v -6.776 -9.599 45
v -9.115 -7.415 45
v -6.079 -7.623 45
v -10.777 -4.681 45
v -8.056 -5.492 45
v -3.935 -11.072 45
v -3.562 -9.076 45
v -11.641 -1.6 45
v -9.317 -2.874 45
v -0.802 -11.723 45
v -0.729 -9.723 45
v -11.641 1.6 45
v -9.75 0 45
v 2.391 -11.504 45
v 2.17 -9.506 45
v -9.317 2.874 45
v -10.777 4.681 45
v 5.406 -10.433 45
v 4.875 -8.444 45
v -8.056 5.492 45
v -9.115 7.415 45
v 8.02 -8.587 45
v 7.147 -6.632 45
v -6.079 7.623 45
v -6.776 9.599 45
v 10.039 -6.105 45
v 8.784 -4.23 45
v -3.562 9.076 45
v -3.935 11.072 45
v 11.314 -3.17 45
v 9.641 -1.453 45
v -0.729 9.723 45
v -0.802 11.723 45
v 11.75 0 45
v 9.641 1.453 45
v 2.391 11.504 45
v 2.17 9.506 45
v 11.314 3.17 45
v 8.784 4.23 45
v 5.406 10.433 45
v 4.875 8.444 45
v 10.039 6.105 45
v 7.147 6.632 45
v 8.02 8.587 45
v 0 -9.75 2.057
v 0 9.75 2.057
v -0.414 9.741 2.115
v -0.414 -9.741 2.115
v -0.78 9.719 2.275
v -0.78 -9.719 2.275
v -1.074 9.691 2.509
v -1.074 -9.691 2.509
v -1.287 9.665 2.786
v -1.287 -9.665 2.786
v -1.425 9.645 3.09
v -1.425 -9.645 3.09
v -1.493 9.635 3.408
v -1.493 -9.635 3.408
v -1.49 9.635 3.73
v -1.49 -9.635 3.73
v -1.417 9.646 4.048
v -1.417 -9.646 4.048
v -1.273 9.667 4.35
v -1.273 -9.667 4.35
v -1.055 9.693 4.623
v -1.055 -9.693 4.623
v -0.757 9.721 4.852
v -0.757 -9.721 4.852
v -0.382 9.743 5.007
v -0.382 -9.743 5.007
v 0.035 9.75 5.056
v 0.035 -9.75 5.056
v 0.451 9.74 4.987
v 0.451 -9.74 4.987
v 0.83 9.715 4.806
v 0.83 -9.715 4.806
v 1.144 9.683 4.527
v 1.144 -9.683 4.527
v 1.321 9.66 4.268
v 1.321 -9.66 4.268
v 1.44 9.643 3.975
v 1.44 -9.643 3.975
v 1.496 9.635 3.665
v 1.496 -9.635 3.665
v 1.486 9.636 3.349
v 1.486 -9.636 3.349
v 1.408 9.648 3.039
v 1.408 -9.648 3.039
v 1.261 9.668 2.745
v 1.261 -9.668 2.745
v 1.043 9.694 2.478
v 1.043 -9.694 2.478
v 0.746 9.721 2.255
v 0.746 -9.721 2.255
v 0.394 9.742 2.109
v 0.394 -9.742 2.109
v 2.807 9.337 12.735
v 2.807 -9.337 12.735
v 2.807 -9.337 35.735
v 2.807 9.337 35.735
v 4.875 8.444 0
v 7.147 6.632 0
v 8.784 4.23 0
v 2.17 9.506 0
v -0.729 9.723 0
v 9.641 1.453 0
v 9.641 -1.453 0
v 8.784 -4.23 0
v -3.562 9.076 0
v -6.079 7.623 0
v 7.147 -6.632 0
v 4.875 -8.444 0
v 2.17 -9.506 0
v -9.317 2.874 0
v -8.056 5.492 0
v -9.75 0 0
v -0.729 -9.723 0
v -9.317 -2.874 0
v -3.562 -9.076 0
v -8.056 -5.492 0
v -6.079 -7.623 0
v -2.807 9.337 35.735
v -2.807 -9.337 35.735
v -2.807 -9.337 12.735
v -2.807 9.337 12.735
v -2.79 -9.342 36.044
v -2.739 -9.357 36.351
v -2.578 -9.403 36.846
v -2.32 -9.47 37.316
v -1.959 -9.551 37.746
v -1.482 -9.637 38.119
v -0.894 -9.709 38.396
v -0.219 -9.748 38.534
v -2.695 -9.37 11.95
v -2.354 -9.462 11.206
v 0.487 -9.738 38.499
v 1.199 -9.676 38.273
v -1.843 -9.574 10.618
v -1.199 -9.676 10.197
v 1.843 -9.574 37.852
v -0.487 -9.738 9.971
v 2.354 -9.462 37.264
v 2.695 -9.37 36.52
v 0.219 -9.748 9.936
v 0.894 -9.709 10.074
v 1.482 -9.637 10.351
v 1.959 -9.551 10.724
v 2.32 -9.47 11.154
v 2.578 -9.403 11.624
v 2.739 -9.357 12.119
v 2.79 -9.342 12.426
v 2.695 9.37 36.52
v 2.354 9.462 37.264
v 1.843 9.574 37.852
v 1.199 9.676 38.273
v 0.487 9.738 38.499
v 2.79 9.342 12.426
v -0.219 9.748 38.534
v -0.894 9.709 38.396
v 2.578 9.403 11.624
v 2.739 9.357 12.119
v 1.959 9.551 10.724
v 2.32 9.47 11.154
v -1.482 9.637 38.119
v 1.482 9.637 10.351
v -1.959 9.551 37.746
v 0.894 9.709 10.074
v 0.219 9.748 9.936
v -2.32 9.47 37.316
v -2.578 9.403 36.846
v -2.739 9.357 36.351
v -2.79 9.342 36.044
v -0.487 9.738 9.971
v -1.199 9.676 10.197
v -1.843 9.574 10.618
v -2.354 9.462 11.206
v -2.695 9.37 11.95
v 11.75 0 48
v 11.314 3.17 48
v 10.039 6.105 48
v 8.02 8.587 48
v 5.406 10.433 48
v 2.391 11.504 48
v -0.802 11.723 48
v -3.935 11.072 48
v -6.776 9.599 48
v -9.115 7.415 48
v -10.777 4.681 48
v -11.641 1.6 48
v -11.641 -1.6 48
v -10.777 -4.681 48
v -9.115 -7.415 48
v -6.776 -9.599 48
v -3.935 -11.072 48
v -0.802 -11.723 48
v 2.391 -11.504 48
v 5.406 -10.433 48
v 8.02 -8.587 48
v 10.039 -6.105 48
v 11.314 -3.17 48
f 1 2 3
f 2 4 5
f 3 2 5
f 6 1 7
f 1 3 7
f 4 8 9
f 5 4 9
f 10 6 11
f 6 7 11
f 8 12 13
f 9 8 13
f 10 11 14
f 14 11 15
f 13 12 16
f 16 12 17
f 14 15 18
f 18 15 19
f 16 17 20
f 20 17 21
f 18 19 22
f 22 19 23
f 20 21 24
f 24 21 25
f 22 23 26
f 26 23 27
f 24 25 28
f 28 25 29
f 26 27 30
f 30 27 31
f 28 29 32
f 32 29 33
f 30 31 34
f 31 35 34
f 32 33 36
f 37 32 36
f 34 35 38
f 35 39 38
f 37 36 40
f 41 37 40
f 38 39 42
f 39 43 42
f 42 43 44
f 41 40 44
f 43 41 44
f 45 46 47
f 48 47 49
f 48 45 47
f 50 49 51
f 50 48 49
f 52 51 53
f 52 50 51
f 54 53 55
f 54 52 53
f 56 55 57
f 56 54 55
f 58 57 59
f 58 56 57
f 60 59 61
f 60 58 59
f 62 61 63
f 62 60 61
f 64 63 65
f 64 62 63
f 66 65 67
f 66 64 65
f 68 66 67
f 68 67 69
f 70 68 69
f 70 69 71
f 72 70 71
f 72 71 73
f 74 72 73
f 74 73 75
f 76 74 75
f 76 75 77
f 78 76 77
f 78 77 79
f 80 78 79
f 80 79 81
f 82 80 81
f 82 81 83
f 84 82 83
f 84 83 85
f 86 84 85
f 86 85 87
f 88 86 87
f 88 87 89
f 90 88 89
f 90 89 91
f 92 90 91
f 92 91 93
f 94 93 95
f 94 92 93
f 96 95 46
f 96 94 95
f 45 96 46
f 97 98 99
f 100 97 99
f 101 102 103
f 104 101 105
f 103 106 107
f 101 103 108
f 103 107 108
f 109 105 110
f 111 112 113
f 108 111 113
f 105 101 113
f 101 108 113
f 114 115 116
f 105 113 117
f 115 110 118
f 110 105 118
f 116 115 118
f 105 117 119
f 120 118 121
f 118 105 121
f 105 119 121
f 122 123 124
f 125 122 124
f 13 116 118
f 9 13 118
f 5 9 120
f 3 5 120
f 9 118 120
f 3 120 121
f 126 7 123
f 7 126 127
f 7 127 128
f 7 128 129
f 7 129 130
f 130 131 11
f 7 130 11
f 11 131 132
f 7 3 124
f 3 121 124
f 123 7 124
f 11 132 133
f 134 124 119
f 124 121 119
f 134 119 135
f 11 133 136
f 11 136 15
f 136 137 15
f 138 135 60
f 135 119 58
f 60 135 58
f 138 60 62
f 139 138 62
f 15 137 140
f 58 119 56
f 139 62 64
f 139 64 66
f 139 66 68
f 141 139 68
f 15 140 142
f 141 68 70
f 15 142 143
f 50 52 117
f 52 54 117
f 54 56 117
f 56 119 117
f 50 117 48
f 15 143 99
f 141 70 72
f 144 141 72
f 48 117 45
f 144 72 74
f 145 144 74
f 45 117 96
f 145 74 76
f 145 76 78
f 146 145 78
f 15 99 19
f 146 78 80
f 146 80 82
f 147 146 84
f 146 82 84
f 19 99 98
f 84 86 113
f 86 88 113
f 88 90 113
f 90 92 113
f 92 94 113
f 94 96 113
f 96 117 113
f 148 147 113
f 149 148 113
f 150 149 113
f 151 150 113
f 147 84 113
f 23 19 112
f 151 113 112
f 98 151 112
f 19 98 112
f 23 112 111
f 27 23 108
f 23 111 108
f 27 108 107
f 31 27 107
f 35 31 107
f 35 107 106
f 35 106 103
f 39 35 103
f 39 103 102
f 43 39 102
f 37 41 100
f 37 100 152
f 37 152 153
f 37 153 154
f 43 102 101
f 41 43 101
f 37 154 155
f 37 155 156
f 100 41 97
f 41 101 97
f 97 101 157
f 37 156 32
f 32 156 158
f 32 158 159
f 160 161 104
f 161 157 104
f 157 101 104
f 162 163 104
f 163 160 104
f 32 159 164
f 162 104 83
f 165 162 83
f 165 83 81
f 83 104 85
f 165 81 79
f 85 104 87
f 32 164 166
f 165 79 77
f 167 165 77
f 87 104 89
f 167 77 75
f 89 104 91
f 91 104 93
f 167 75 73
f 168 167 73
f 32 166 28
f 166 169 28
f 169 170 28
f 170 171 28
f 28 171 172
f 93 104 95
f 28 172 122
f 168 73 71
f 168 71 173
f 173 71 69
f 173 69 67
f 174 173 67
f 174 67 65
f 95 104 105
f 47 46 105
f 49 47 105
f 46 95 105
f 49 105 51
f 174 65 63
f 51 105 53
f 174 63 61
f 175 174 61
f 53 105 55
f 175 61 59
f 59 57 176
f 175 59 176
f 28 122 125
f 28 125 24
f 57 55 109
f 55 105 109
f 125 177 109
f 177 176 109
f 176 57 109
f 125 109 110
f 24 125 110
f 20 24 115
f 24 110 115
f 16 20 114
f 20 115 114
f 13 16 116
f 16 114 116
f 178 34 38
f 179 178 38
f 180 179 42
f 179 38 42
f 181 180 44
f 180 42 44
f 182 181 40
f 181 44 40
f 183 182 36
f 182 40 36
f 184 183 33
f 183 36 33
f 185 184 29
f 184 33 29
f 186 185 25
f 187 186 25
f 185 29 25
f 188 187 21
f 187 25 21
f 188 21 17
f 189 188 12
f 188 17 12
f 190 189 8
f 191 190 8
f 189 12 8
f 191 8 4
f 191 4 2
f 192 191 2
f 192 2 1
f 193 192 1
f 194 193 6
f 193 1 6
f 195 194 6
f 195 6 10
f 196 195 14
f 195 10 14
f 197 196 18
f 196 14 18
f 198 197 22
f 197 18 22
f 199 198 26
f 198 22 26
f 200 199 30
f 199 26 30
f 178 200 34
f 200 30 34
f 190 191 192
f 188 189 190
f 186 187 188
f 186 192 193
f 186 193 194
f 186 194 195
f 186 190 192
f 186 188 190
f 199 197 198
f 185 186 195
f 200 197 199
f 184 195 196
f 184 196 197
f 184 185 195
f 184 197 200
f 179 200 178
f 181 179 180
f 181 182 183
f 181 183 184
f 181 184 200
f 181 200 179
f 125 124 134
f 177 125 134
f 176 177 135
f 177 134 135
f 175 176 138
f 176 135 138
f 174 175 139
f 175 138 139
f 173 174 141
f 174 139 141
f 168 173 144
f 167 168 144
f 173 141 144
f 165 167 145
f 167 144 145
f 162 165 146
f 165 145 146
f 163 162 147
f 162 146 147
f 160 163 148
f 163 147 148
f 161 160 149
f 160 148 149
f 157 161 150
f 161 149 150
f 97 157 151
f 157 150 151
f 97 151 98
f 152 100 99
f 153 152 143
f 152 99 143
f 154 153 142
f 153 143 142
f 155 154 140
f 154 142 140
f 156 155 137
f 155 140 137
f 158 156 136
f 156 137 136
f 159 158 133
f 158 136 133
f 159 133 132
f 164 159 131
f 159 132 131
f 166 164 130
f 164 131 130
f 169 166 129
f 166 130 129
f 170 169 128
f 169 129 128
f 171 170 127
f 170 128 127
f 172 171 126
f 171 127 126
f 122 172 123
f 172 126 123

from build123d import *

# Parameters (mm, degrees)
SKETCH1_R               = 9.75
BOSS_EXTRUDE1_DEPTH     = 45
SKETCH2_R               = 11.75
BOSS_EXTRUDE2_DEPTH     = 3
CUT_EXTRUDE1_DEPTH      = 13
CUT_EXTRUDE1_DEPTH_BACK = 23
CUT_EXTRUDE2_DEPTH      = 23
CUT_EXTRUDE2_DEPTH_BACK = 23
SKETCH5_R               = 1.5


with BuildPart() as part:
    # Sketch1 → Boss-Extrude1 (new body)
    with BuildSketch(Plane.XY):
        Circle(SKETCH1_R)
    extrude(amount=BOSS_EXTRUDE1_DEPTH)

    # Sketch2 → Boss-Extrude2 (add)
    with BuildSketch(Plane.XY.offset(45)):
        Circle(SKETCH2_R)
    extrude(amount=BOSS_EXTRUDE2_DEPTH)

    # Sketch4 → Cut-Extrude1 (cut, two sides: drawn at the far end of the back side and taken through both)
    with BuildSketch(Plane(origin=(0, 0, 0), x_dir=(1, 0, 0), z_dir=(0, 1, 0)).offset(-CUT_EXTRUDE1_DEPTH_BACK)):
        with BuildLine():
            Line((2.80710702, -12.735), (2.80710702, -35.735))
            ThreePointArc((2.80710702, -35.735), (0, -38.54210702), (-2.80710702, -35.735))
            Line((-2.80710702, -35.735), (-2.80710702, -12.735))
            ThreePointArc((-2.80710702, -12.735), (0, -9.92789298), (2.80710702, -12.735))
        make_face()
    extrude(amount=CUT_EXTRUDE1_DEPTH + CUT_EXTRUDE1_DEPTH_BACK, mode=Mode.SUBTRACT)

    # Sketch5 → Cut-Extrude2 (cut, two sides: drawn at the far end of the back side and taken through both)
    with BuildSketch(Plane(origin=(0, 0, 0), x_dir=(1, 0, 0), z_dir=(0, 1, 0)).offset(-CUT_EXTRUDE2_DEPTH_BACK)):
        with Locations((0, -3.556649542)):
            Circle(SKETCH5_R)
    extrude(amount=CUT_EXTRUDE2_DEPTH + CUT_EXTRUDE2_DEPTH_BACK, mode=Mode.SUBTRACT)


solid = part.part
